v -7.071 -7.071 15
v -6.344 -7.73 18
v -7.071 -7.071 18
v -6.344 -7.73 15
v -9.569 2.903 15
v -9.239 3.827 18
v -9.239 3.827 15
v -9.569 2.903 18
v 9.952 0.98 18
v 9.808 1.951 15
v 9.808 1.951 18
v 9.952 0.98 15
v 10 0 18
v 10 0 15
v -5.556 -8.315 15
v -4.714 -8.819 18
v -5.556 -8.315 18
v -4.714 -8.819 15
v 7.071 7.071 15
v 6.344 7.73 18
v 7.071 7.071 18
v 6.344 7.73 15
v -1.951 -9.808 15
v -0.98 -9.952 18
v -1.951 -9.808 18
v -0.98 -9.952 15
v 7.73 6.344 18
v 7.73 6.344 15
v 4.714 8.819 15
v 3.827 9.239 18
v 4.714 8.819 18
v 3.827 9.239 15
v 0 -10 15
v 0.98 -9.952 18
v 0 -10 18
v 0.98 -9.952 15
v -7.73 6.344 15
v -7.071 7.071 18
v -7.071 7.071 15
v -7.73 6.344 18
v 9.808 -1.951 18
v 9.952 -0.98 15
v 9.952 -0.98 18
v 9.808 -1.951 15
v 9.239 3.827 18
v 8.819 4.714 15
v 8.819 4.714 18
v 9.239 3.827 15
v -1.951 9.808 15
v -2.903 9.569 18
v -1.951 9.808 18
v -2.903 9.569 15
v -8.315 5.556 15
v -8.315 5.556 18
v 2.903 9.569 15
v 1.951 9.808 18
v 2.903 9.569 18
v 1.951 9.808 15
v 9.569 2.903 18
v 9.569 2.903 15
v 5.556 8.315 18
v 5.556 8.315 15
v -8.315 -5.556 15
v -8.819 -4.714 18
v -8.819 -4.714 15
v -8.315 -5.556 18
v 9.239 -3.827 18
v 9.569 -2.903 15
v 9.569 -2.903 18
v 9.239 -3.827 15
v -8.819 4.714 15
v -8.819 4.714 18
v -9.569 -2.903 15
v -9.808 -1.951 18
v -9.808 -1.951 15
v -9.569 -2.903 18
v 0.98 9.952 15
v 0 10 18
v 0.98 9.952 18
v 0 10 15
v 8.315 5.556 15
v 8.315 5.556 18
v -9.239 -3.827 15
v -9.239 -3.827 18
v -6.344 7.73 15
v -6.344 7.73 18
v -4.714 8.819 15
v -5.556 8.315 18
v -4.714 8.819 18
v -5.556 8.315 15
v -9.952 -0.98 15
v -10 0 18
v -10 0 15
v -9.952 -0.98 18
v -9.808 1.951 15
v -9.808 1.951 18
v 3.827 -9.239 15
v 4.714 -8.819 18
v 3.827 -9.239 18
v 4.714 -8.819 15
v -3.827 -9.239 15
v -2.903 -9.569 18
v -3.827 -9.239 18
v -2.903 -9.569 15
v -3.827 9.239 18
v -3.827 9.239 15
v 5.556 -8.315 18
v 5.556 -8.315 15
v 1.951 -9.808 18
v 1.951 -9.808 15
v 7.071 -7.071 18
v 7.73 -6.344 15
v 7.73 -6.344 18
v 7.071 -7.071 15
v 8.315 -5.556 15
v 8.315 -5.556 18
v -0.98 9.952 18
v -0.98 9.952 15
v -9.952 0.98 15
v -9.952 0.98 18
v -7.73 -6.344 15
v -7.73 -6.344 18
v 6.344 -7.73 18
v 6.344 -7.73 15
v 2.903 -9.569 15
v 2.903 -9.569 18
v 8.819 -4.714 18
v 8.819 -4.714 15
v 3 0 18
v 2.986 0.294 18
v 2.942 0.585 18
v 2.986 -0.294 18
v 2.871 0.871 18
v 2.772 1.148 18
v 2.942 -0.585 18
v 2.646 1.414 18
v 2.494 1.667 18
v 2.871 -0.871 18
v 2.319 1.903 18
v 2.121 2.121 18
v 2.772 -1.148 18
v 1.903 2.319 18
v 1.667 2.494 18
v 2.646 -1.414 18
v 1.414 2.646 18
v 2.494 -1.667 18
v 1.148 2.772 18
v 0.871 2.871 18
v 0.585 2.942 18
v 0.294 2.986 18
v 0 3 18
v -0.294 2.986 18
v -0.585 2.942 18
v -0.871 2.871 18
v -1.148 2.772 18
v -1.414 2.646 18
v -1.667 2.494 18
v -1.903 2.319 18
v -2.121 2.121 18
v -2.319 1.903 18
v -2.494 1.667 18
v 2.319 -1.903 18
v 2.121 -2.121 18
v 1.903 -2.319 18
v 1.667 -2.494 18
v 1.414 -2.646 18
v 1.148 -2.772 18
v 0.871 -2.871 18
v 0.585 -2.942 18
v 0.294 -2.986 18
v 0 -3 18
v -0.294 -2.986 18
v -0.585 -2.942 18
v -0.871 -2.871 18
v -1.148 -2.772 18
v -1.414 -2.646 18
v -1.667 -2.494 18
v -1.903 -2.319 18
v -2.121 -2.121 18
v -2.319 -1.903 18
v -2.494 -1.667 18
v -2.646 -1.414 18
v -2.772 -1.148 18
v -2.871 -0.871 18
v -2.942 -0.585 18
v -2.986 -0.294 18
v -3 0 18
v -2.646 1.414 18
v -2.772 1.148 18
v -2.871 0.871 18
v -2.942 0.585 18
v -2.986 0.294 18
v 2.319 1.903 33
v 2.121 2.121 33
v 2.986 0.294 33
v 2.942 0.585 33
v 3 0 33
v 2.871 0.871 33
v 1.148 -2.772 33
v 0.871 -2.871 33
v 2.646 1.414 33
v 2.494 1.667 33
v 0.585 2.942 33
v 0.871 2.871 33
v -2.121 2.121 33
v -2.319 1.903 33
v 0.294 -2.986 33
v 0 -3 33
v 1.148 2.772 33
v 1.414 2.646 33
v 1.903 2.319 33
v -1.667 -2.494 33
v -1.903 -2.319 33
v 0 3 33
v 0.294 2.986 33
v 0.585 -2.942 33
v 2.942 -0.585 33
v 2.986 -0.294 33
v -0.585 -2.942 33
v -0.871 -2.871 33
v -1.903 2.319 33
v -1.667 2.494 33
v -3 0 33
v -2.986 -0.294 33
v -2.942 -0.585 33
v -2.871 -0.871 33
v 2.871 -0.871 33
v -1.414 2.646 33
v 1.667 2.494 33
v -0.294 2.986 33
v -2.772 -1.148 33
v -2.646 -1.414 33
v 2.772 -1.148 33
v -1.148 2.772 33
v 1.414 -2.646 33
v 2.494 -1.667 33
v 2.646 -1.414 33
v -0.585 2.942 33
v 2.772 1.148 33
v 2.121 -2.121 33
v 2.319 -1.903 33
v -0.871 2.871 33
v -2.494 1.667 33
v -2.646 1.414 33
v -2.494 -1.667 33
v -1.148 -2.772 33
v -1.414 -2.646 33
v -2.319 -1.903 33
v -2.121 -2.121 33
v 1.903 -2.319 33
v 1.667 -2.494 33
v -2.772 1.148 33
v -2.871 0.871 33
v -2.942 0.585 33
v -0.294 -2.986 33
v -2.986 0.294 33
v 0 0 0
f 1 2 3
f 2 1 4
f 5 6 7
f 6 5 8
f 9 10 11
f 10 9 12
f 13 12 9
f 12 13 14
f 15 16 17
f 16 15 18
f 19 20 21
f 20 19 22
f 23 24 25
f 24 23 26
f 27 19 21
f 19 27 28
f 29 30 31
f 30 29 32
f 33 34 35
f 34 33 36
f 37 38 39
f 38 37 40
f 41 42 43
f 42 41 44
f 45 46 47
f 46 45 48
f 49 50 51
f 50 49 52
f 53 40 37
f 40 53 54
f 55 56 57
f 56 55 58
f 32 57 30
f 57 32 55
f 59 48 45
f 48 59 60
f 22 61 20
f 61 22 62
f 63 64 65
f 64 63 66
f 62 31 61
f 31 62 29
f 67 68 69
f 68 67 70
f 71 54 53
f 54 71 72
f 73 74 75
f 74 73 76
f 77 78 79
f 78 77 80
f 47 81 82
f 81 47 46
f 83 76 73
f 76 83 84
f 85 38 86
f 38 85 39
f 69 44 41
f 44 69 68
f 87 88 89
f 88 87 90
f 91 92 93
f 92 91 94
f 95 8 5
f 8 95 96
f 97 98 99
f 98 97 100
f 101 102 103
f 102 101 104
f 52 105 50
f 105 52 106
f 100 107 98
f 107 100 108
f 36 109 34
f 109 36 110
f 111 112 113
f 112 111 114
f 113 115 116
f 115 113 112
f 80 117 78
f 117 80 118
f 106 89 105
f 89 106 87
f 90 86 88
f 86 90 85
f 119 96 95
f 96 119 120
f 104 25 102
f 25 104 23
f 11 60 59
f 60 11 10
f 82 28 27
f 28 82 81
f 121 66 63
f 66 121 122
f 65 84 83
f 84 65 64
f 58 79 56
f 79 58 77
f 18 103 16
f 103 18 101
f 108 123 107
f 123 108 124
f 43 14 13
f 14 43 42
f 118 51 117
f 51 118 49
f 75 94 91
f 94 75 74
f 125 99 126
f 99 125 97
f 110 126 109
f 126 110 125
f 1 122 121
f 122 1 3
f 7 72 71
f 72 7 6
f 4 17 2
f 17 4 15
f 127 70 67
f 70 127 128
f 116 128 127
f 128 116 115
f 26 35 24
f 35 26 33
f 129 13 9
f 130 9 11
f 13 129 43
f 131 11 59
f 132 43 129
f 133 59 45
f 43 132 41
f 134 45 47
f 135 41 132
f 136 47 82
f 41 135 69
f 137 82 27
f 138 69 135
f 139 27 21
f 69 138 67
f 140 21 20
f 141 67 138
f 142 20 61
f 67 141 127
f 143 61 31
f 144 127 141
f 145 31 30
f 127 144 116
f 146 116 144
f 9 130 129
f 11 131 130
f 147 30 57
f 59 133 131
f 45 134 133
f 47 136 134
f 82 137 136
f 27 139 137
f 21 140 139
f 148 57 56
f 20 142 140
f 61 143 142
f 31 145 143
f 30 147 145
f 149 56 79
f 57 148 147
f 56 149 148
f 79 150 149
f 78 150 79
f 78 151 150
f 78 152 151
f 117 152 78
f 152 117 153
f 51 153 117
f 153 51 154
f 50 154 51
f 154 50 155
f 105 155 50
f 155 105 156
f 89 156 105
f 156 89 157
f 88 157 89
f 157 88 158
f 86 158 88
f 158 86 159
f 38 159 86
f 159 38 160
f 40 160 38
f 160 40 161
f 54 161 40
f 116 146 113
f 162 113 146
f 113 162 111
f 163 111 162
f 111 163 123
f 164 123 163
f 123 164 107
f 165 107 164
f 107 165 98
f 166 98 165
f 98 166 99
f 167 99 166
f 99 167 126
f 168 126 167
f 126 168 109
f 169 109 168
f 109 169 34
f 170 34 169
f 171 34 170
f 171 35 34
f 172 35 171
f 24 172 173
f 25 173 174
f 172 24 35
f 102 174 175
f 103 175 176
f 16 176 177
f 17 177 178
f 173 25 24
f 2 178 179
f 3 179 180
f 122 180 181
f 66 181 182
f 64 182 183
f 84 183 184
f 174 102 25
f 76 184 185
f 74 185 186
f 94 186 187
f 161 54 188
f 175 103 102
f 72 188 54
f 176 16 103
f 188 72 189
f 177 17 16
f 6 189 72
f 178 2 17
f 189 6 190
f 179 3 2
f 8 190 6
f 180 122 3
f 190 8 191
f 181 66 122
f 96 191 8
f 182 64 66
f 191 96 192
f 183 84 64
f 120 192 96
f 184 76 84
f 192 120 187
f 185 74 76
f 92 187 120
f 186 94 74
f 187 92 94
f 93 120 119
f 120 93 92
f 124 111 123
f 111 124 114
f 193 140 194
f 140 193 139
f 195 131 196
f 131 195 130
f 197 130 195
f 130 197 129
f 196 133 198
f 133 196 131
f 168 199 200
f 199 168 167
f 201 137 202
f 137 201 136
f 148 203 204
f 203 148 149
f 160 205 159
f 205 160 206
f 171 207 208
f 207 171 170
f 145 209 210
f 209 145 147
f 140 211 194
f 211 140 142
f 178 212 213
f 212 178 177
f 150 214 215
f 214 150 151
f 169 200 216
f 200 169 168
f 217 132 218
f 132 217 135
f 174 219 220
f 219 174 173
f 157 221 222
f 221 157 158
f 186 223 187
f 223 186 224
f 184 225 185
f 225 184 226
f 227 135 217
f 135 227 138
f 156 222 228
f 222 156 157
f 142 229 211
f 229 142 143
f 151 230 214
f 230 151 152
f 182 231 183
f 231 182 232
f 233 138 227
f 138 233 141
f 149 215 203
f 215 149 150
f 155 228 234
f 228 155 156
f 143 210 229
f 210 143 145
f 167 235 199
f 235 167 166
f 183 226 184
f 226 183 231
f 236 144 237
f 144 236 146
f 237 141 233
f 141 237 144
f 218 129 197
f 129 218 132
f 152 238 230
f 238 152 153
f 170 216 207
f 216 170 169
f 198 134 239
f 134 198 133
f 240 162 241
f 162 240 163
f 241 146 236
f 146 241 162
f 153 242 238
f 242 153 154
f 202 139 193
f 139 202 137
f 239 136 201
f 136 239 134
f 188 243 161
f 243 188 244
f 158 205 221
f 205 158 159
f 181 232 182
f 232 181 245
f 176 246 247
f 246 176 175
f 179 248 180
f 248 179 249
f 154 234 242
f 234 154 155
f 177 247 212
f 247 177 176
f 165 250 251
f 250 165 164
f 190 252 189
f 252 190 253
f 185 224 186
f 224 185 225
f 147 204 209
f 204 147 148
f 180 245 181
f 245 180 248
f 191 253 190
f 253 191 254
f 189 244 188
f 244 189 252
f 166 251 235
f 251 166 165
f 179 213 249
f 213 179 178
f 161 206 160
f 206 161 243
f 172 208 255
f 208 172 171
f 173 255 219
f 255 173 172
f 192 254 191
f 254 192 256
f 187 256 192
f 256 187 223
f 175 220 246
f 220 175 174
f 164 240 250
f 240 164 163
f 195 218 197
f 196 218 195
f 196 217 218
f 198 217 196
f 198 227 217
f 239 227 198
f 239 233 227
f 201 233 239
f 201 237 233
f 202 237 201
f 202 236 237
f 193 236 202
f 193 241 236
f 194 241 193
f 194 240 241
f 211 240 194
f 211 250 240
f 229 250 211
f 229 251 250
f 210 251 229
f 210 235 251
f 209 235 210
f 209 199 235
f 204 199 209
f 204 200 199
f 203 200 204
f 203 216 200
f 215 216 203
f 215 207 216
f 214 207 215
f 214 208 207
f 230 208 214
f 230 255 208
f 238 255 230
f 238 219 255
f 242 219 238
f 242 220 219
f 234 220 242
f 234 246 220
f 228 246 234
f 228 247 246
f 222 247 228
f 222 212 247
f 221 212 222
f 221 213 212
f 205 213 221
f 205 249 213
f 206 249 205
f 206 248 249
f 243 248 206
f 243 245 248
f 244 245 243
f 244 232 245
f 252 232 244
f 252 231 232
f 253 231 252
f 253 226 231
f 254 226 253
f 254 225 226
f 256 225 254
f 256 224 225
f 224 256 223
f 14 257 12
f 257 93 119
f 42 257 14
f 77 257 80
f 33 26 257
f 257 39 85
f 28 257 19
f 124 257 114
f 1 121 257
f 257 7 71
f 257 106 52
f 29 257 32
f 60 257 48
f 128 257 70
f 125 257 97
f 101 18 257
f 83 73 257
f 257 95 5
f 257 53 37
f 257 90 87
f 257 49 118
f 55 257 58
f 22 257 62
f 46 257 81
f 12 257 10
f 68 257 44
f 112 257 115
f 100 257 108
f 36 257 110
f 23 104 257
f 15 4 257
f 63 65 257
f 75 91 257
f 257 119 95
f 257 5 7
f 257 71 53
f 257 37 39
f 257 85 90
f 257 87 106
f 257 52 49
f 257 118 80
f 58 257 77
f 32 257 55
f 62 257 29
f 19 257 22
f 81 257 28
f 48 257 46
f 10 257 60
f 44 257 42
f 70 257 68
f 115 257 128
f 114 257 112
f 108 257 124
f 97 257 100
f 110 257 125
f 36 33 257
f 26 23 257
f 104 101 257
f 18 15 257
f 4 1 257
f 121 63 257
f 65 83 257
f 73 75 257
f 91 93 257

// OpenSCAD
//######################VARIBLES#####################
//handle properties

//handle height
handle_height = 15;
//handle diamater
handle_diamater = 6;

//(optional) cylinder flywheel

//use flywheel
flywheel = "on";//[on, off]
//flywheel height
flywheel_height = 3;
//flywheel diamater
flywheel_diamater = 20;

//cone (can act as flywheel)

//cone height
cone_height = 15;
//cone diamater
cone_top_diamater = 20;

//seperate objects(for supportless printing)
seperate = "off";//[on,off]

//seperation distance
sep_dist = 10;
//joiner
join = "clip";//[none, pin, clip]
//joiner width
join_d = 4;
//joiner length
join_l = 5;
//tolerance(free space left in joiner, good if your pritner isnt accurate)
tolerance = 0.1;

//accuracy
$fn=64;
//#################END OF VARIABLES##################

//converting units
handle_r = handle_diamater/2;
flywheel_r = flywheel_diamater/2;
cone_top_r = cone_top_diamater/2;
join_r = join_d/2;

//simple old code, no seperation
if (seperate == "off")
{
	//bottom cone
	cylinder(cone_height, 0, cone_top_r);
	
	//different behaviour with and without flywheel
	if(flywheel == "on")
	{
		//flywheel
		translate([0,0,cone_height]) cylinder(flywheel_height, flywheel_r, flywheel_r);
		//handle
		translate([0,0,cone_height+flywheel_height]) cylinder(handle_height, handle_r, handle_r);
	}
	else
	{
		translate([0,0,cone_height]) cylinder(handle_height, handle_r, handle_r);
	}
}
else//seperate code
{
		//handle
	cylinder(handle_height, handle_r, handle_r);
	//joiner
	translate([0,0,handle_height])joiner();
	//different logic needed with and without flywheel
	if(flywheel == "on")
	{	
		//is the cone or flywheel larger
		if(flywheel_r > cone_top_r)
		{	
			difference()
			{
				//make flywheel/cone into one object
				union()	
				{
					//make flywheel
					translate([handle_r+flywheel_r+sep_dist,0,0]) cylinder(flywheel_height, flywheel_r, flywheel_r);
					//make cone
					translate([handle_r+flywheel_r+sep_dist,0,flywheel_height]) cylinder(cone_height,cone_top_r, 0);
				}
				translate([handle_r+flywheel_r+sep_dist,0,0])joiner("female");
			}
		
		}
		else
		{	
			echo("WARNING : cone bigger than flywheel, overhang inevitable!!!!!!(unless the overhang is very small, you should inspect the model before use)");
			difference()
			{
				//make flywheel/cone into one object
				union()	
				{
					//make flywheel
					translate([handle_r+cone_top_r+sep_dist,0,0]) cylinder(flywheel_height, flywheel_r, flywheel_r);
					//make cone
					translate([handle_r+cone_top_r+sep_dist,0,flywheel_height]) cylinder(cone_height,cone_top_r, 0);
				}
				translate([handle_r+cone_top_r+sep_dist,0,0])joiner("female");
			}
		}
	}
	else
	{
		//put clip/pin hole in cone
		difference()
			{
				//make cone
				translate([handle_r+cone_top_r+sep_dist,0,0]) cylinder(cone_height,cone_top_r, 0);
				translate([handle_r+cone_top_r+sep_dist,0,0])joiner("female");
			}
	}
}

//simple place for all joiners(used to be repeated many times)
module joiner(gen = "male", type = join, joinerl = join_l, joinerr = join_r, tol = tolerance)
{
	//male clip
	if (gen == "male")
	{
		if(type == "pin")
		{
			//simple cylinder pin	
			cylinder(joinerl,joinerr,joinerr);
		}
		if(type == "clip")
		{
			//press clip
			difference()
			{
				//start with pin shaped cylinder
				cylinder(joinerl,joinerr,joinerr);
				difference()
				{
					//create mask to remove narrow portion
					//start with a larger shorter cylinder, then hollow out the middle
					translate([0,0,-1]) cylinder(joinerl*0.7+1,joinerr*1.1,joinerr*1.1);
					translate([0,0,-1]) cylinder(joinerl*0.7+1,joinerr*0.8,joinerr*0.8);
				}
				difference()
				{
					//bevel on top for easy use
					//mask made with large cylinder, then subtracting bevel shape using cone cylinder
					translate([0,0,joinerl*0.8]) cylinder(joinerl,joinerr*1.1,joinerr);
					translate([0,0,joinerl*0.8]) cylinder(joinerl*0.7,joinerr,0);
				}
				//take out slice in middle
				translate([0-joinerr*1.1,0-joinerr*0.3,joinerl*0.2]) cube([joinerr*2.2,joinerr*0.6, joinerl*1.1]);
				//trim the sides to make them flat, anti spin, ease of use
				translate([0-joinerr*1.05,0-joinerr,0-joinerl*0.05]) cube([joinerr*0.3,joinerr*2,joinerl*1.1]);
				translate([joinerr*0.75,0-joinerr,0-joinerl*0.05]) cube([joinerr*0.3,joinerr*2,joinerl*1.1]);
			}
		}
	}
	//female mask, to subtract
	if(gen == "female")
	{
		if(type == "pin")
		{
			translate([0,0,0])cylinder(joinerl+tol,joinerr+tol,joinerr+tol);
		}
		if(type == "clip")
		{
			difference()
			{
				//start with pin shaped cylinder, bigger for tolerance
				cylinder(joinerl+tol,joinerr+tol,joinerr+tol);
				difference()
				{
					//create mask to remove narrow portion, with more tolerance	
					//start with a larger shorter cylinder, then hollow out the middle
					cylinder(joinerl*0.7-tol,joinerr*1.1+tol,joinerr*1.1+tol);
					cylinder(joinerl*0.7-tol,joinerr*0.8+tol,joinerr*0.8+tol);
				}
				//trim the sides to make them flat, anti spin, ease of use
				translate([0-joinerr*1.05-tol,0-joinerr,0-joinerl*0.05]) cube([joinerr*0.3,joinerr*2,joinerl*1.1]);
				translate([joinerr*0.75+tol,0-joinerr,0-joinerl*0.05]) cube([joinerr*0.3,joinerr*2,joinerl*1.1]);
			}
		}
	}
}
